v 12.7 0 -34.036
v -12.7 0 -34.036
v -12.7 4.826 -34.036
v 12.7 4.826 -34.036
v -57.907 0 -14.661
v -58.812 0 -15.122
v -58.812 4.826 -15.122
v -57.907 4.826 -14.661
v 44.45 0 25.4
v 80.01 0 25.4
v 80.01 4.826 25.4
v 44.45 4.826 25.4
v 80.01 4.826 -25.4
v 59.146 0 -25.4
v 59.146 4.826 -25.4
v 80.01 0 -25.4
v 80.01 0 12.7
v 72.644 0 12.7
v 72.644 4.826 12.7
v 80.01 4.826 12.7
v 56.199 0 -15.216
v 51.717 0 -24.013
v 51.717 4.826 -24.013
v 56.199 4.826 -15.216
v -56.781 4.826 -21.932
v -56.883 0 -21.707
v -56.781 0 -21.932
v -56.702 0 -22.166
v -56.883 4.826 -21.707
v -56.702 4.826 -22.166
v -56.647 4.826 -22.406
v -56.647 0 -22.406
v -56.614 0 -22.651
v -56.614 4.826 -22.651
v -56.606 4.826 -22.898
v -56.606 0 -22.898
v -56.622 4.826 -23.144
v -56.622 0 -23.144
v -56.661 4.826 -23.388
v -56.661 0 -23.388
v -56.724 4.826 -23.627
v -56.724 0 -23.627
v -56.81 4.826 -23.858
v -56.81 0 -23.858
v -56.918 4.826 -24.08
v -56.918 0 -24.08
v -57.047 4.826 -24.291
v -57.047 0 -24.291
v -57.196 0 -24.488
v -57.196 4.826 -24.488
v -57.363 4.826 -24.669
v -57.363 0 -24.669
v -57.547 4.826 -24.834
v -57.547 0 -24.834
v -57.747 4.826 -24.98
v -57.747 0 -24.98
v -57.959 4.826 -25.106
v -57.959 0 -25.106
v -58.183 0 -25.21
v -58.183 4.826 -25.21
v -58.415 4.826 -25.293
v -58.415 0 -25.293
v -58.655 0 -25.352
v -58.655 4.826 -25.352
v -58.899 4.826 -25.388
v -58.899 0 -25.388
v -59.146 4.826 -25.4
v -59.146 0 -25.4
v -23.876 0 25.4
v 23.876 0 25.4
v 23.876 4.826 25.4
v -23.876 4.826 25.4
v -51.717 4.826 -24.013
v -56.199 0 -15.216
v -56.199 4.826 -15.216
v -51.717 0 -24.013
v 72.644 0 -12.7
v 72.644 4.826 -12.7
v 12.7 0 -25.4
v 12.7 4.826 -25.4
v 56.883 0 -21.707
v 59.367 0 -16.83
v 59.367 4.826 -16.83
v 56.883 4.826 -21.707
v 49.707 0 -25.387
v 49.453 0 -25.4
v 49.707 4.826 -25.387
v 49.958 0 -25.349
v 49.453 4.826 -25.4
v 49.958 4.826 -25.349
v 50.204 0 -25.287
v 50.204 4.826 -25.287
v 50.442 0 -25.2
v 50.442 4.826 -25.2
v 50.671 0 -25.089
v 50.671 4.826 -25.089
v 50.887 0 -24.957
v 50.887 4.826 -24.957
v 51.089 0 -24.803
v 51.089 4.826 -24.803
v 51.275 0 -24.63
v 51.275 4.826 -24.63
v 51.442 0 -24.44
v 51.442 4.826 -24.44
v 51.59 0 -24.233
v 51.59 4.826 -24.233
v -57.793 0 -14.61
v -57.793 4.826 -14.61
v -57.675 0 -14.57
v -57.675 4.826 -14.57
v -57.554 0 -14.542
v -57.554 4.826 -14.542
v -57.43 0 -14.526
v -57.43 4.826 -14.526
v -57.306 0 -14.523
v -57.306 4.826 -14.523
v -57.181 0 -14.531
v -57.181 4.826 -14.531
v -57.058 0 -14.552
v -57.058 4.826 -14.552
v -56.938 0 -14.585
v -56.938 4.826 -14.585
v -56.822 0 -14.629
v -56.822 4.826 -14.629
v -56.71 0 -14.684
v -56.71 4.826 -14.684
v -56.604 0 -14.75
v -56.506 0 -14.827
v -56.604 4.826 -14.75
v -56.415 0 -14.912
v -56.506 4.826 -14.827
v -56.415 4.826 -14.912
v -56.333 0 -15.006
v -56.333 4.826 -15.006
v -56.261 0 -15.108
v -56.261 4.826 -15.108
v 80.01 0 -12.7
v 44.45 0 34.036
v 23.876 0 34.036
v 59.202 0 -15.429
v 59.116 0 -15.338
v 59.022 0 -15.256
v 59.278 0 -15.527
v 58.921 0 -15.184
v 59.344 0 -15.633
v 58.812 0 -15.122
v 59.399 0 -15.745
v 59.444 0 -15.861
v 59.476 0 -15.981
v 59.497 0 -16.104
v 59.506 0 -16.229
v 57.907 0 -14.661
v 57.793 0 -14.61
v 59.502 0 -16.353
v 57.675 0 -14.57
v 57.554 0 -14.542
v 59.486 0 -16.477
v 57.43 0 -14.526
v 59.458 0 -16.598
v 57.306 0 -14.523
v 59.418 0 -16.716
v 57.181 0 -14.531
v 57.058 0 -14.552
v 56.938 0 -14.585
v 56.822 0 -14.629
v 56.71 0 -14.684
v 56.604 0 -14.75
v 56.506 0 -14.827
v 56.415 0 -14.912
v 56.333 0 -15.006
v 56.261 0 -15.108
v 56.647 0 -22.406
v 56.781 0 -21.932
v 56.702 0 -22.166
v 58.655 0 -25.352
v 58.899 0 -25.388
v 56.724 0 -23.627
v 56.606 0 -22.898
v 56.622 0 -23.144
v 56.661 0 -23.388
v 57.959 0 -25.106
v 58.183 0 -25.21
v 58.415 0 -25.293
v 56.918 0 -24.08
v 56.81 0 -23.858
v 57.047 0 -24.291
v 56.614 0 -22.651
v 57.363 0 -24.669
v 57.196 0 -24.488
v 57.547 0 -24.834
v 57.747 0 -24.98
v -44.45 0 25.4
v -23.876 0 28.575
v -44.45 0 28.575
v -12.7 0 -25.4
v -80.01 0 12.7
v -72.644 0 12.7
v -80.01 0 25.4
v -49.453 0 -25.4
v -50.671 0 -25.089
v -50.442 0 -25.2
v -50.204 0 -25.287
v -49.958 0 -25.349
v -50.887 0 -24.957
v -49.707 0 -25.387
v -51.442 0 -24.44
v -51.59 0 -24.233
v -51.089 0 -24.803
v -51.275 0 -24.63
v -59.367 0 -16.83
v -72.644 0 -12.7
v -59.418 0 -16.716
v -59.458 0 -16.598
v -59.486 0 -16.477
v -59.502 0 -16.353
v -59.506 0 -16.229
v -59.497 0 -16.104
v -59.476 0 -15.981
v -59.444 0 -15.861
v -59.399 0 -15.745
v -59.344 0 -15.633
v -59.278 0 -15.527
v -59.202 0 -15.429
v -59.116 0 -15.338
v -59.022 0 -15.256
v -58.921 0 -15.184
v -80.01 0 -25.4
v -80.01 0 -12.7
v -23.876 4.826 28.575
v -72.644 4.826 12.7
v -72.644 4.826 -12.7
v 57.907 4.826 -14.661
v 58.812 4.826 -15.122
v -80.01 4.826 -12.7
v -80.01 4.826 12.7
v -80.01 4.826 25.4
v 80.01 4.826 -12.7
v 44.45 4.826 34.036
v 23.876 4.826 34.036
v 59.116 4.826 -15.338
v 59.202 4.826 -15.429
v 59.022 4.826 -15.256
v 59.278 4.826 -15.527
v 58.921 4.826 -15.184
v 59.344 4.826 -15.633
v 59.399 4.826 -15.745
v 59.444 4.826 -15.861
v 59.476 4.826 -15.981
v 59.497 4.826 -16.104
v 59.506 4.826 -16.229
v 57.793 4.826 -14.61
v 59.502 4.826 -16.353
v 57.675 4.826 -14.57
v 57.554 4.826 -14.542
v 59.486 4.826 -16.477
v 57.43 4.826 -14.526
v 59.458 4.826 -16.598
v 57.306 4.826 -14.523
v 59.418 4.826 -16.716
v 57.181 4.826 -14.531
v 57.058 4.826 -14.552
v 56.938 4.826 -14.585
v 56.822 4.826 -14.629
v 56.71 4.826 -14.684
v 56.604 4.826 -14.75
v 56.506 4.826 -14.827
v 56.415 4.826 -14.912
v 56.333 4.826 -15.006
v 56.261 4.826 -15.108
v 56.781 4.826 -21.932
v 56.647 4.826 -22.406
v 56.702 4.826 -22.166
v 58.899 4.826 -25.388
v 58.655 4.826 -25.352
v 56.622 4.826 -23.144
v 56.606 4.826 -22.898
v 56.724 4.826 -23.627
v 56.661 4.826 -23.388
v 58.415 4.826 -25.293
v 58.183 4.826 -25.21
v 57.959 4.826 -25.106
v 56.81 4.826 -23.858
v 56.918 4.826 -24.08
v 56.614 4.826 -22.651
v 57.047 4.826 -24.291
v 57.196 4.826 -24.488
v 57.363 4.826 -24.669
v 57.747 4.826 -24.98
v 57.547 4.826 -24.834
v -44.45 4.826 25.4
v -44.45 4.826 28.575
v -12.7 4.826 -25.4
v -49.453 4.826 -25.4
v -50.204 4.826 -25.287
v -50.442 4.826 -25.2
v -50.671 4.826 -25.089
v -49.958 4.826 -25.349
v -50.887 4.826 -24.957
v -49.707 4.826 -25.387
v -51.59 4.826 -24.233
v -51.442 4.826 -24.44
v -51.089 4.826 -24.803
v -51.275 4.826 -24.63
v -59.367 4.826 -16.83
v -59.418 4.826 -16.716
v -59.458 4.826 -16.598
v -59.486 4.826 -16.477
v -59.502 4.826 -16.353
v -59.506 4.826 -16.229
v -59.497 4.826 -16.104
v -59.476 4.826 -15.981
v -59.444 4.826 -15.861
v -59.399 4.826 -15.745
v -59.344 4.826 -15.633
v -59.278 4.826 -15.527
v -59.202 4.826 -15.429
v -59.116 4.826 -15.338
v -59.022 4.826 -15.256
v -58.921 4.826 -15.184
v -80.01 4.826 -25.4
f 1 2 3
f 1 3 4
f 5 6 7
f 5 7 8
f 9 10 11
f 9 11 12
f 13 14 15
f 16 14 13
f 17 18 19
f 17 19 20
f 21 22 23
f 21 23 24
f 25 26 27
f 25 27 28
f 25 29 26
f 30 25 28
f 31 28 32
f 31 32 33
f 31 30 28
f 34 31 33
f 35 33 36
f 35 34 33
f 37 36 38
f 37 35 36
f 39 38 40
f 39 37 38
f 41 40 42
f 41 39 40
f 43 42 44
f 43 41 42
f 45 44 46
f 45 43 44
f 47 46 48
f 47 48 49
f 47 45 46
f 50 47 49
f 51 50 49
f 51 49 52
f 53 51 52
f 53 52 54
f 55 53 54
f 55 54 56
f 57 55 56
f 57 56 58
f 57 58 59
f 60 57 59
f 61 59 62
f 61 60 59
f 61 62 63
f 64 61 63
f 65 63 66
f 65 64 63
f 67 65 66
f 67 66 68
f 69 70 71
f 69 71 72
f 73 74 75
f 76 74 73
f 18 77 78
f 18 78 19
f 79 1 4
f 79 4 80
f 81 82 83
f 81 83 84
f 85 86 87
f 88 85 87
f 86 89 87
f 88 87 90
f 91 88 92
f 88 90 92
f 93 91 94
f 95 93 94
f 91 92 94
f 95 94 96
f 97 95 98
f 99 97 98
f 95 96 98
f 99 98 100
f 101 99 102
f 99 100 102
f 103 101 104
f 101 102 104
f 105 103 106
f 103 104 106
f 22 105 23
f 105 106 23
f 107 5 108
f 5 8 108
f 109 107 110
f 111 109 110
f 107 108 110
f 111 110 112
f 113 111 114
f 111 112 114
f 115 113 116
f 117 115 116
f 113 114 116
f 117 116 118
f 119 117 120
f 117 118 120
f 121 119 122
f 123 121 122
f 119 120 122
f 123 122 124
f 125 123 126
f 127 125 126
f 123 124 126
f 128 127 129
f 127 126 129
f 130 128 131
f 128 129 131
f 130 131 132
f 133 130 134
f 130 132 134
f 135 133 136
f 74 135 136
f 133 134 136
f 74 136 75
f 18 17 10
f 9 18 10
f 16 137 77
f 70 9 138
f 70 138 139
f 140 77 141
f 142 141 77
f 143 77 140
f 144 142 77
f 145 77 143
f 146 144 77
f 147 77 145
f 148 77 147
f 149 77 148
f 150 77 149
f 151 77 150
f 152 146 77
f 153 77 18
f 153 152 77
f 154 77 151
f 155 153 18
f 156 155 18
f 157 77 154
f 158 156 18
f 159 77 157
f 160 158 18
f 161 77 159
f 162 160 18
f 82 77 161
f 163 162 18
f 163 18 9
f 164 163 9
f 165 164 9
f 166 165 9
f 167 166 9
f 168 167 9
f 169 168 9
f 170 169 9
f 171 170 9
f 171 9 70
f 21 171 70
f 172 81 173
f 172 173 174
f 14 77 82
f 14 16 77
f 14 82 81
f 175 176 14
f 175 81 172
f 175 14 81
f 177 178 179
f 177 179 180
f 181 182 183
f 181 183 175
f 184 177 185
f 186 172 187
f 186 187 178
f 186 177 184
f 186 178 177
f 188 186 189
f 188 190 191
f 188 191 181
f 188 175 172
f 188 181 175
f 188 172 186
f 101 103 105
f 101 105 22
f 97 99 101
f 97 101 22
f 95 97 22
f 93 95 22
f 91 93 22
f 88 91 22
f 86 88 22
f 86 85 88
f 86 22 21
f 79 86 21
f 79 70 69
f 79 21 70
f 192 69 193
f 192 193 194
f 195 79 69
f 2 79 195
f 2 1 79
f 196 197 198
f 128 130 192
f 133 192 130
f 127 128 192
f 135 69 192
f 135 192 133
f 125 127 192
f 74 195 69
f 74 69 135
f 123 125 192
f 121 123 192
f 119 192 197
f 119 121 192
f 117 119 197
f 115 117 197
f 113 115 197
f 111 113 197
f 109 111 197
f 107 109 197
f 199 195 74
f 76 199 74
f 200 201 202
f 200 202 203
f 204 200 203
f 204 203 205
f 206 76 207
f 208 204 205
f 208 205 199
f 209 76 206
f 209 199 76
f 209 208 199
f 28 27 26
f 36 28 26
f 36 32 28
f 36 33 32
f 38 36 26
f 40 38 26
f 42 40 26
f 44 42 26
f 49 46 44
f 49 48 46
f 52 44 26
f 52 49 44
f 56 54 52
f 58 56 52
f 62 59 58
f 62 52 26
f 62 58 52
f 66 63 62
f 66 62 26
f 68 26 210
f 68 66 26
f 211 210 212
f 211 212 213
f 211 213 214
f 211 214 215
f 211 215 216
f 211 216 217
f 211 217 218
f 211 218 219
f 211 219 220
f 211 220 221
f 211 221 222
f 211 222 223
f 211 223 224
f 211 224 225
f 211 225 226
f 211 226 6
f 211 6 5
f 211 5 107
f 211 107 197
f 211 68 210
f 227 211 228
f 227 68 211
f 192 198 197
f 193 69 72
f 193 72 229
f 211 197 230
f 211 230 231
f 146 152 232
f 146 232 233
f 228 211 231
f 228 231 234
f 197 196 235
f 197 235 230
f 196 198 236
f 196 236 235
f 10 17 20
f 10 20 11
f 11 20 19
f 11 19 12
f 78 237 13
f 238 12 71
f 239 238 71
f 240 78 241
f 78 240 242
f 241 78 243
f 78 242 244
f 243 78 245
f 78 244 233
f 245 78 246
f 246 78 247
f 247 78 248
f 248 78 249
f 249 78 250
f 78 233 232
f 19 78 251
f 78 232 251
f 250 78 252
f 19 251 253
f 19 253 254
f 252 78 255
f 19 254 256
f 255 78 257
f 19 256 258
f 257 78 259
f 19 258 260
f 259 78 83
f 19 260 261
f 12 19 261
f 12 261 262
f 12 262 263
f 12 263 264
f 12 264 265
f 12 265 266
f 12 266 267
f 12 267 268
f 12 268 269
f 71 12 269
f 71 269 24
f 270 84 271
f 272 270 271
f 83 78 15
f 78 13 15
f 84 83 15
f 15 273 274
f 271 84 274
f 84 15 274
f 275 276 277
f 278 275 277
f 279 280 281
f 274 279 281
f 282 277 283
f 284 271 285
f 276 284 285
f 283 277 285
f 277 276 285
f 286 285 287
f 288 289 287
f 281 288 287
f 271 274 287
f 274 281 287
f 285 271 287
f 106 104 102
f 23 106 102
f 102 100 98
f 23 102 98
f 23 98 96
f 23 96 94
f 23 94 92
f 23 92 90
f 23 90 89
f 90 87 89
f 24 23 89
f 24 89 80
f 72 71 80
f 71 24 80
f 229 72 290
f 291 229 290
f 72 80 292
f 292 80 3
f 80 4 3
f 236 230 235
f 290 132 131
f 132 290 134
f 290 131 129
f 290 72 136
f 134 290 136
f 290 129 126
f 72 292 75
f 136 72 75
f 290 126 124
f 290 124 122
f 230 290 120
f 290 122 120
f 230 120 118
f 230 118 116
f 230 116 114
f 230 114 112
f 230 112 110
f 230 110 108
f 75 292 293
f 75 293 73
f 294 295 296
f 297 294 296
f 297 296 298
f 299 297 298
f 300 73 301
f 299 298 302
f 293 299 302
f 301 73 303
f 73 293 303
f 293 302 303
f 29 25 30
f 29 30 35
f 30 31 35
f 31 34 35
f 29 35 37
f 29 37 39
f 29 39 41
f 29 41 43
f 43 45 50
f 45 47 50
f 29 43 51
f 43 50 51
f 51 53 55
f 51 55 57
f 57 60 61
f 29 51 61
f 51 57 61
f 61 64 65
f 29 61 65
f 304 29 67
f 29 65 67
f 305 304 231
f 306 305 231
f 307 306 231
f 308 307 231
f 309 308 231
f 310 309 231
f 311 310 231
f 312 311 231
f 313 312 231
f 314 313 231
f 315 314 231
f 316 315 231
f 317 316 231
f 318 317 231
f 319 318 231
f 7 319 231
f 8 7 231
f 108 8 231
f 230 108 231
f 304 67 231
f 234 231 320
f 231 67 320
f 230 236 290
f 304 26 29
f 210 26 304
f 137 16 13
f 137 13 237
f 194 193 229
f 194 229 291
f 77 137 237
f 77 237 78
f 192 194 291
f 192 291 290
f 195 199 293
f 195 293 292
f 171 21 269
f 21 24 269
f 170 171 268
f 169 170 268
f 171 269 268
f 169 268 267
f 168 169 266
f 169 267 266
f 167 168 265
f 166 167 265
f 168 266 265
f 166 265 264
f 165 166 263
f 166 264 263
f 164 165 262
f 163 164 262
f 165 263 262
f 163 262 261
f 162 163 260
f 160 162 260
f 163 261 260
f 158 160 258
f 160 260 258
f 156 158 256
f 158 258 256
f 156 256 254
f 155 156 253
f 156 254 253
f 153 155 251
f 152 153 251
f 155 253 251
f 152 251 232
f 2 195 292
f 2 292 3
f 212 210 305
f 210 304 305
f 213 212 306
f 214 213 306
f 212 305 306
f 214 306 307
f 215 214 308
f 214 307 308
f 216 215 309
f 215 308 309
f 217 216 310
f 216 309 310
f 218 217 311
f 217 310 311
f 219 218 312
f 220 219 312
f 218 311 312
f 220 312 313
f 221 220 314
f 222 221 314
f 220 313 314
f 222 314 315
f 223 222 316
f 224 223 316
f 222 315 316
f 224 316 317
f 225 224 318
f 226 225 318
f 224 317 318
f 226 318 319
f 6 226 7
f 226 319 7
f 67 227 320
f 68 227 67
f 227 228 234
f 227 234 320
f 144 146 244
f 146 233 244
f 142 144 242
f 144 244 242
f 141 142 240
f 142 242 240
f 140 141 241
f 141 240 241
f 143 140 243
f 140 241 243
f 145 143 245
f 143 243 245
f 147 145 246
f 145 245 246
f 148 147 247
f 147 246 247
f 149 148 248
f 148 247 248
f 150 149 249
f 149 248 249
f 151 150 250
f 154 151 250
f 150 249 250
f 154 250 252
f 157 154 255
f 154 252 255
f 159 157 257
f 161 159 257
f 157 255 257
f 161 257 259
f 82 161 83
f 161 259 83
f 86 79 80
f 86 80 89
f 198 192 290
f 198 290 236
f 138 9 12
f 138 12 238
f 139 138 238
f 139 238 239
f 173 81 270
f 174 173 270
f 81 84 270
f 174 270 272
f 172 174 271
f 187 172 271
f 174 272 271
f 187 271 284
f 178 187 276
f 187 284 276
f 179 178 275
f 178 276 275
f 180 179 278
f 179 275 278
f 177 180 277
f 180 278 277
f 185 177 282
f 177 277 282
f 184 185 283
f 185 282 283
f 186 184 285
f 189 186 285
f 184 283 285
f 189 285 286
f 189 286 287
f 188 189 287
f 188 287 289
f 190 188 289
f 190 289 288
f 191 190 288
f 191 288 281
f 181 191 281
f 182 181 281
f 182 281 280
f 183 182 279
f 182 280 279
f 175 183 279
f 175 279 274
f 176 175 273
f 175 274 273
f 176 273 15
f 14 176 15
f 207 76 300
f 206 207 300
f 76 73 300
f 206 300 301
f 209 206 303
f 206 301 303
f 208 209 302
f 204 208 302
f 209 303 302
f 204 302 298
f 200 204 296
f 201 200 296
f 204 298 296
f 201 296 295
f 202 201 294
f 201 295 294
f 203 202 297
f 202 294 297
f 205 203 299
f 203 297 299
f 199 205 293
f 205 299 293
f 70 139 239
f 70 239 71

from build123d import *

# Parameters (mm, degrees)
BOSS_EXTRUDE1_DEPTH = 4.826
FILLET1_R           = 1.27
FILLET2_R           = 2.54


with BuildPart() as part:
    # Sketch1 → Boss-Extrude1 (new body)
    with BuildSketch(Plane(origin=(0, 0, 0), x_dir=(1, 0, 0), z_dir=(0, 1, 0))):
        Polygon((-80.01, 25.4), (-55.000893554, 25.4), (-59.944, 15.69860736), (-56.7755808, 14.084217143), (-51.009901453, 25.4), (-12.7, 25.4), (-12.7, 34.036), (12.7, 34.036), (12.7, 25.4), (51.009901453, 25.4), (56.7755808, 14.084217143), (59.944, 15.69860736), (55.000893554, 25.4), (80.01, 25.4), (80.01, 12.7), (72.644, 12.7), (72.644, -12.7), (80.01, -12.7), (80.01, -25.4), (44.45, -25.4), (44.45, -34.036), (23.876, -34.036), (23.876, -25.4), (-23.876, -25.4), (-23.876, -28.575), (-44.45, -28.575), (-44.45, -25.4), (-80.01, -25.4), (-80.01, -12.7), (-72.644, -12.7), (-72.644, 12.7), (-80.01, 12.7), align=None)
    extrude(amount=BOSS_EXTRUDE1_DEPTH)

    # Fillet1
    fillet1_edges = [part.edges().sort_by_distance(p)[0] for p in [
        (-59.944, 2.413, -15.69860736),
        (-56.7755808, 2.413, -14.084217143),
        (56.7755808, 2.413, -14.084217143),
        (59.944, 2.413, -15.69860736),
    ]]
    fillet(fillet1_edges, radius=FILLET1_R)

    # Fillet2
    fillet2_edges = [part.edges().sort_by_distance(p)[0] for p in [
        (-55.000893554, 2.413, -25.4),
        (-51.009901453, 2.413, -25.4),
        (51.009901453, 2.413, -25.4),
        (55.000893554, 2.413, -25.4),
    ]]
    fillet(fillet2_edges, radius=FILLET2_R)


solid = part.part
